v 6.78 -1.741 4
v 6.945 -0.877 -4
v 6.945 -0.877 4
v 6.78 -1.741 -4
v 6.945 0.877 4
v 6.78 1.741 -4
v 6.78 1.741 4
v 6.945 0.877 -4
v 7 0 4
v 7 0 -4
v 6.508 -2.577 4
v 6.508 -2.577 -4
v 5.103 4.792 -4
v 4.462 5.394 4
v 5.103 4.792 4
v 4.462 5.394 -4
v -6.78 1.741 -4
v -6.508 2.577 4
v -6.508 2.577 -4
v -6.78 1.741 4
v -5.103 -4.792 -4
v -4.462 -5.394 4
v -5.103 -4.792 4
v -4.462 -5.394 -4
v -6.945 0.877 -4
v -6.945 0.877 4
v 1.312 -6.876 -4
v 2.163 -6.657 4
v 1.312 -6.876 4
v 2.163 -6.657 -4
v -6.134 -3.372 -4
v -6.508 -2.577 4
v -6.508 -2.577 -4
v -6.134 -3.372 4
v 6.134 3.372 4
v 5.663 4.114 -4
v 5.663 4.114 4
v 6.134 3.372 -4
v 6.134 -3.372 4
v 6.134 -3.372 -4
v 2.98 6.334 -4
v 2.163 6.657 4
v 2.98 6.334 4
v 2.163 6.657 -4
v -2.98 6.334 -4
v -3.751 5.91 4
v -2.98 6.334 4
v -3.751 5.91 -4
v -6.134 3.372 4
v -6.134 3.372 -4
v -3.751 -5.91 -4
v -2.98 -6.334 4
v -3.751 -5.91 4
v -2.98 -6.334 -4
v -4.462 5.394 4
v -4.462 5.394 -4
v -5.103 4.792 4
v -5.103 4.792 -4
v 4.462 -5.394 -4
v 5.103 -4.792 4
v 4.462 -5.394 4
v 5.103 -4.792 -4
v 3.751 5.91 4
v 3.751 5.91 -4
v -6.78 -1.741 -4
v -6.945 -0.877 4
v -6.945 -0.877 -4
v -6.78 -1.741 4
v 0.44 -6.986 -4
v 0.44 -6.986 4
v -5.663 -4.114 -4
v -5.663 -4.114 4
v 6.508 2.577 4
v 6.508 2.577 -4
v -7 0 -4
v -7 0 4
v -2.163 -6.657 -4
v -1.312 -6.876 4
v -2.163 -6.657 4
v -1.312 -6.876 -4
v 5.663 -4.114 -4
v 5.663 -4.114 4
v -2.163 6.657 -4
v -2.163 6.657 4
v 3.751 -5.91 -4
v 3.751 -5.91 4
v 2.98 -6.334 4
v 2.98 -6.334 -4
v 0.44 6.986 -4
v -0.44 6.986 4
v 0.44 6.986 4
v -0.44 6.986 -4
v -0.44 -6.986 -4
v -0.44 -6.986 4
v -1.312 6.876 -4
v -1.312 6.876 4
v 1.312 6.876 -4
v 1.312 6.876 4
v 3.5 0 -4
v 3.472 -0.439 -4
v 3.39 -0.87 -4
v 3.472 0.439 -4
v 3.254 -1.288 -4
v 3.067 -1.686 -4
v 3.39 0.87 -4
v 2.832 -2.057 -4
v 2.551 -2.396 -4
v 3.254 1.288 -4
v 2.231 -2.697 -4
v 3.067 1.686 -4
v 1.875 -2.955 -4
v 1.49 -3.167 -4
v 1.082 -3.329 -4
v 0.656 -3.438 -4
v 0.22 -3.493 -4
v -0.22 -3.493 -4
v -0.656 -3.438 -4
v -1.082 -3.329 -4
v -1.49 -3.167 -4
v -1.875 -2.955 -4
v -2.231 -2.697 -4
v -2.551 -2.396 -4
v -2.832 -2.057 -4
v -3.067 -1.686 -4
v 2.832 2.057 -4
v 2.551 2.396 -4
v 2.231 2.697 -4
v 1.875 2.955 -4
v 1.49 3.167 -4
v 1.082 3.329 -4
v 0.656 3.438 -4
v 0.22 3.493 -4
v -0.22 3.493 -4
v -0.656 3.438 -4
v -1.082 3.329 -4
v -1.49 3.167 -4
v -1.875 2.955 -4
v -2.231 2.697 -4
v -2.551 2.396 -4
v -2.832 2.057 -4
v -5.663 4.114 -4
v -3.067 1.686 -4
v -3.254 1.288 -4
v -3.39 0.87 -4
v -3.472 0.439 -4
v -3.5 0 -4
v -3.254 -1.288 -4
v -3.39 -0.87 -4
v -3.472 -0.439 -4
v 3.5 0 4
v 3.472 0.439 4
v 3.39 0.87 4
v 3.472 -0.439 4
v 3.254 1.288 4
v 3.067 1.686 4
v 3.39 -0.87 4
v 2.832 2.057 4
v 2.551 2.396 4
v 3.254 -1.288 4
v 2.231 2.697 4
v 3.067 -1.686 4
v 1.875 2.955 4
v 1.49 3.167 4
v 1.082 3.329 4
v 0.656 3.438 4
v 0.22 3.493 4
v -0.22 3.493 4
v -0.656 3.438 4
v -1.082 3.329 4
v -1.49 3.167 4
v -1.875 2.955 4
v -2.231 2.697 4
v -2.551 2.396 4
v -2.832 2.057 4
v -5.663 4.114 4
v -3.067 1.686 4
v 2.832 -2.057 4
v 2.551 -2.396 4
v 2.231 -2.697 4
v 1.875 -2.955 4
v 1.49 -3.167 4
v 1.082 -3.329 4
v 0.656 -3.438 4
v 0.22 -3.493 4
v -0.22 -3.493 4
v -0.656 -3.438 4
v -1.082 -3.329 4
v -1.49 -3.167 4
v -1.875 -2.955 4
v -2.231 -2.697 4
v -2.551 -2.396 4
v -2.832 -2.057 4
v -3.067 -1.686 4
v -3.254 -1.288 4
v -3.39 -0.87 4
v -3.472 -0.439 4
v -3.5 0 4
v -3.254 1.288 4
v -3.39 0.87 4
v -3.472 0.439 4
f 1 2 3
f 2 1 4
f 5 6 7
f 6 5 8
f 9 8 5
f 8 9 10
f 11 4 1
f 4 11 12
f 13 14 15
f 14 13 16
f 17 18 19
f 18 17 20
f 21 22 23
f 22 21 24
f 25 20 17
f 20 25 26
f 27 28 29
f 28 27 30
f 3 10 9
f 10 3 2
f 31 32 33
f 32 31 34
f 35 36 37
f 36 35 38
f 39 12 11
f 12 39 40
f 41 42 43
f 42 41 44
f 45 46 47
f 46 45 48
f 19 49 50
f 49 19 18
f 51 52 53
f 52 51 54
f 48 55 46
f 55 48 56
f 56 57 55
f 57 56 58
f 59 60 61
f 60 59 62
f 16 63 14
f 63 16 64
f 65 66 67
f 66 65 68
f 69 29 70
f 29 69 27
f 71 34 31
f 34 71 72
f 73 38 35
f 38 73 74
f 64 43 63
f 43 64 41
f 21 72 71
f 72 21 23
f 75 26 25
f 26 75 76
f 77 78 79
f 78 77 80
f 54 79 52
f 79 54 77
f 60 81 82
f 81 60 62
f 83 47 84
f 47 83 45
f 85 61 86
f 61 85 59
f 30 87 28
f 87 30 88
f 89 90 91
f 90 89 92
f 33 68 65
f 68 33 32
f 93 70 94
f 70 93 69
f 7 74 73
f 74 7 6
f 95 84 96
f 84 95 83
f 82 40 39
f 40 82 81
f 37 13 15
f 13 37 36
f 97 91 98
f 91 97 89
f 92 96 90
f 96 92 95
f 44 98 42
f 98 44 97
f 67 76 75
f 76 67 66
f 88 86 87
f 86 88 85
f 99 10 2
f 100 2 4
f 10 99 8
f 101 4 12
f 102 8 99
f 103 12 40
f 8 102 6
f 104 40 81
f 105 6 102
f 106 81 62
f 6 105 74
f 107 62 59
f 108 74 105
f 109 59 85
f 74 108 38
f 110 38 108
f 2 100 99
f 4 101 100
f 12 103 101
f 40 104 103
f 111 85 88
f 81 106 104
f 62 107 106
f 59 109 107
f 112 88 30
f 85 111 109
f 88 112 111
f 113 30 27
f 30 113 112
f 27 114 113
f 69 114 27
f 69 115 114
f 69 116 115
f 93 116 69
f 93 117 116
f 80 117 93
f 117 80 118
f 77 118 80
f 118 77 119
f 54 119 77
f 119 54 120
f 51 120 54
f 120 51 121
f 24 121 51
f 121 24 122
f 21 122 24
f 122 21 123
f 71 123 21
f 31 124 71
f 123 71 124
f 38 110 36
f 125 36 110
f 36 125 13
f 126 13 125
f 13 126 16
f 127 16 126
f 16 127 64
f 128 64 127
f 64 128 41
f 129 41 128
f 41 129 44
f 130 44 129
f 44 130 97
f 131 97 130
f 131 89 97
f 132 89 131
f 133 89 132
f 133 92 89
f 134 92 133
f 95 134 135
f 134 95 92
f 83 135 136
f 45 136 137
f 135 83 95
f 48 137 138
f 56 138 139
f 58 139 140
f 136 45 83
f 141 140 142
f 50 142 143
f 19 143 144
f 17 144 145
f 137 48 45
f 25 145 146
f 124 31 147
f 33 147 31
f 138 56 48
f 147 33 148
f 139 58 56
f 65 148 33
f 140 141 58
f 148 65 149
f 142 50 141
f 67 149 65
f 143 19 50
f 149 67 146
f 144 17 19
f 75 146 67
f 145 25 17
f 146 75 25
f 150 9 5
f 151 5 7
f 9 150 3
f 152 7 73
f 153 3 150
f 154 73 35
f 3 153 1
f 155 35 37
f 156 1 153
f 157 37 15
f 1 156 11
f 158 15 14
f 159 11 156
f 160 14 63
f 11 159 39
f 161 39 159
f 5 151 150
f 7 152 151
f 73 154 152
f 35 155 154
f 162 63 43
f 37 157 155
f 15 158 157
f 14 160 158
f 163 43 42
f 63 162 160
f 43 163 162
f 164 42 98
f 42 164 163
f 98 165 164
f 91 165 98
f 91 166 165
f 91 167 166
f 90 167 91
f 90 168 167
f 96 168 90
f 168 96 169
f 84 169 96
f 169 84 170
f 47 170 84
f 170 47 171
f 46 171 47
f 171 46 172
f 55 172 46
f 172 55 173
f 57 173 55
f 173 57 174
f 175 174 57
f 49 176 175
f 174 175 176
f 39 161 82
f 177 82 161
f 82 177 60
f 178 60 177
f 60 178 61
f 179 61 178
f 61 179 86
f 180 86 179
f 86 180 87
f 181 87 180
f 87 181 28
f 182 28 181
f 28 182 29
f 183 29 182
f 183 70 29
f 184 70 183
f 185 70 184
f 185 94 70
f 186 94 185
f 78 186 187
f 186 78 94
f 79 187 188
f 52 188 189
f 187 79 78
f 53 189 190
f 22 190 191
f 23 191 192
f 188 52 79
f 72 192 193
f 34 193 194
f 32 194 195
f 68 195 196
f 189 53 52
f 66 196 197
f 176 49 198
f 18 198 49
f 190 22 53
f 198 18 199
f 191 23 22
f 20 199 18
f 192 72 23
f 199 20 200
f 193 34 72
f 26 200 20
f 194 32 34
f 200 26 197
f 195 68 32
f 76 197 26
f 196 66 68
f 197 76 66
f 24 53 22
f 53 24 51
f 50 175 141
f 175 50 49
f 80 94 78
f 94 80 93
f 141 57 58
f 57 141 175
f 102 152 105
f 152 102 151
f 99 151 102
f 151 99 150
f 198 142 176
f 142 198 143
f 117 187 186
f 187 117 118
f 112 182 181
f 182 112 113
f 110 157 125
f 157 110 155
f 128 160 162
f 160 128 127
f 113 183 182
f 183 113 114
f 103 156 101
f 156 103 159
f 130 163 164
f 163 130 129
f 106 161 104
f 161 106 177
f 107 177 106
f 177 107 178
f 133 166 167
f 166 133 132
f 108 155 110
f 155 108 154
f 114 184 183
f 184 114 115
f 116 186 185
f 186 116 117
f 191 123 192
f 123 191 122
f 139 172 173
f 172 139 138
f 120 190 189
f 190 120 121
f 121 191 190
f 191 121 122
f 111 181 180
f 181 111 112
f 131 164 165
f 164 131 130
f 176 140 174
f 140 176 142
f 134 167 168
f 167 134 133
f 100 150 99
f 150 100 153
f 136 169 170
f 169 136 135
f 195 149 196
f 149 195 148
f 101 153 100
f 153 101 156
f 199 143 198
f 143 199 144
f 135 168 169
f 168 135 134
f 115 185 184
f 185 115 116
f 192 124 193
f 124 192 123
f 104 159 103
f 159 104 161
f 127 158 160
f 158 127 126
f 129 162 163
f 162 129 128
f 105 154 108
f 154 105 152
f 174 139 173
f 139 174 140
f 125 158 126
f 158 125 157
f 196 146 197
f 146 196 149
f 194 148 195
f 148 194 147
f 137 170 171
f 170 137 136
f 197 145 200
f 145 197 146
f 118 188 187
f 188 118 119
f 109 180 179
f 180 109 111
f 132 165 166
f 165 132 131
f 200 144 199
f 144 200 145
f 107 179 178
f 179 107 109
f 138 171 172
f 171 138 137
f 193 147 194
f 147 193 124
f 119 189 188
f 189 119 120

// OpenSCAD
$fn = 50;


difference() {
	union() {
		translate(v = [0, 0, -4.0000000000]) {
			cylinder(h = 8, r = 7.0000000000);
		}
	}
	union() {
		translate(v = [0, 0, -100.0000000000]) {
			cylinder(h = 200, r = 3.5000000000);
		}
	}
}
